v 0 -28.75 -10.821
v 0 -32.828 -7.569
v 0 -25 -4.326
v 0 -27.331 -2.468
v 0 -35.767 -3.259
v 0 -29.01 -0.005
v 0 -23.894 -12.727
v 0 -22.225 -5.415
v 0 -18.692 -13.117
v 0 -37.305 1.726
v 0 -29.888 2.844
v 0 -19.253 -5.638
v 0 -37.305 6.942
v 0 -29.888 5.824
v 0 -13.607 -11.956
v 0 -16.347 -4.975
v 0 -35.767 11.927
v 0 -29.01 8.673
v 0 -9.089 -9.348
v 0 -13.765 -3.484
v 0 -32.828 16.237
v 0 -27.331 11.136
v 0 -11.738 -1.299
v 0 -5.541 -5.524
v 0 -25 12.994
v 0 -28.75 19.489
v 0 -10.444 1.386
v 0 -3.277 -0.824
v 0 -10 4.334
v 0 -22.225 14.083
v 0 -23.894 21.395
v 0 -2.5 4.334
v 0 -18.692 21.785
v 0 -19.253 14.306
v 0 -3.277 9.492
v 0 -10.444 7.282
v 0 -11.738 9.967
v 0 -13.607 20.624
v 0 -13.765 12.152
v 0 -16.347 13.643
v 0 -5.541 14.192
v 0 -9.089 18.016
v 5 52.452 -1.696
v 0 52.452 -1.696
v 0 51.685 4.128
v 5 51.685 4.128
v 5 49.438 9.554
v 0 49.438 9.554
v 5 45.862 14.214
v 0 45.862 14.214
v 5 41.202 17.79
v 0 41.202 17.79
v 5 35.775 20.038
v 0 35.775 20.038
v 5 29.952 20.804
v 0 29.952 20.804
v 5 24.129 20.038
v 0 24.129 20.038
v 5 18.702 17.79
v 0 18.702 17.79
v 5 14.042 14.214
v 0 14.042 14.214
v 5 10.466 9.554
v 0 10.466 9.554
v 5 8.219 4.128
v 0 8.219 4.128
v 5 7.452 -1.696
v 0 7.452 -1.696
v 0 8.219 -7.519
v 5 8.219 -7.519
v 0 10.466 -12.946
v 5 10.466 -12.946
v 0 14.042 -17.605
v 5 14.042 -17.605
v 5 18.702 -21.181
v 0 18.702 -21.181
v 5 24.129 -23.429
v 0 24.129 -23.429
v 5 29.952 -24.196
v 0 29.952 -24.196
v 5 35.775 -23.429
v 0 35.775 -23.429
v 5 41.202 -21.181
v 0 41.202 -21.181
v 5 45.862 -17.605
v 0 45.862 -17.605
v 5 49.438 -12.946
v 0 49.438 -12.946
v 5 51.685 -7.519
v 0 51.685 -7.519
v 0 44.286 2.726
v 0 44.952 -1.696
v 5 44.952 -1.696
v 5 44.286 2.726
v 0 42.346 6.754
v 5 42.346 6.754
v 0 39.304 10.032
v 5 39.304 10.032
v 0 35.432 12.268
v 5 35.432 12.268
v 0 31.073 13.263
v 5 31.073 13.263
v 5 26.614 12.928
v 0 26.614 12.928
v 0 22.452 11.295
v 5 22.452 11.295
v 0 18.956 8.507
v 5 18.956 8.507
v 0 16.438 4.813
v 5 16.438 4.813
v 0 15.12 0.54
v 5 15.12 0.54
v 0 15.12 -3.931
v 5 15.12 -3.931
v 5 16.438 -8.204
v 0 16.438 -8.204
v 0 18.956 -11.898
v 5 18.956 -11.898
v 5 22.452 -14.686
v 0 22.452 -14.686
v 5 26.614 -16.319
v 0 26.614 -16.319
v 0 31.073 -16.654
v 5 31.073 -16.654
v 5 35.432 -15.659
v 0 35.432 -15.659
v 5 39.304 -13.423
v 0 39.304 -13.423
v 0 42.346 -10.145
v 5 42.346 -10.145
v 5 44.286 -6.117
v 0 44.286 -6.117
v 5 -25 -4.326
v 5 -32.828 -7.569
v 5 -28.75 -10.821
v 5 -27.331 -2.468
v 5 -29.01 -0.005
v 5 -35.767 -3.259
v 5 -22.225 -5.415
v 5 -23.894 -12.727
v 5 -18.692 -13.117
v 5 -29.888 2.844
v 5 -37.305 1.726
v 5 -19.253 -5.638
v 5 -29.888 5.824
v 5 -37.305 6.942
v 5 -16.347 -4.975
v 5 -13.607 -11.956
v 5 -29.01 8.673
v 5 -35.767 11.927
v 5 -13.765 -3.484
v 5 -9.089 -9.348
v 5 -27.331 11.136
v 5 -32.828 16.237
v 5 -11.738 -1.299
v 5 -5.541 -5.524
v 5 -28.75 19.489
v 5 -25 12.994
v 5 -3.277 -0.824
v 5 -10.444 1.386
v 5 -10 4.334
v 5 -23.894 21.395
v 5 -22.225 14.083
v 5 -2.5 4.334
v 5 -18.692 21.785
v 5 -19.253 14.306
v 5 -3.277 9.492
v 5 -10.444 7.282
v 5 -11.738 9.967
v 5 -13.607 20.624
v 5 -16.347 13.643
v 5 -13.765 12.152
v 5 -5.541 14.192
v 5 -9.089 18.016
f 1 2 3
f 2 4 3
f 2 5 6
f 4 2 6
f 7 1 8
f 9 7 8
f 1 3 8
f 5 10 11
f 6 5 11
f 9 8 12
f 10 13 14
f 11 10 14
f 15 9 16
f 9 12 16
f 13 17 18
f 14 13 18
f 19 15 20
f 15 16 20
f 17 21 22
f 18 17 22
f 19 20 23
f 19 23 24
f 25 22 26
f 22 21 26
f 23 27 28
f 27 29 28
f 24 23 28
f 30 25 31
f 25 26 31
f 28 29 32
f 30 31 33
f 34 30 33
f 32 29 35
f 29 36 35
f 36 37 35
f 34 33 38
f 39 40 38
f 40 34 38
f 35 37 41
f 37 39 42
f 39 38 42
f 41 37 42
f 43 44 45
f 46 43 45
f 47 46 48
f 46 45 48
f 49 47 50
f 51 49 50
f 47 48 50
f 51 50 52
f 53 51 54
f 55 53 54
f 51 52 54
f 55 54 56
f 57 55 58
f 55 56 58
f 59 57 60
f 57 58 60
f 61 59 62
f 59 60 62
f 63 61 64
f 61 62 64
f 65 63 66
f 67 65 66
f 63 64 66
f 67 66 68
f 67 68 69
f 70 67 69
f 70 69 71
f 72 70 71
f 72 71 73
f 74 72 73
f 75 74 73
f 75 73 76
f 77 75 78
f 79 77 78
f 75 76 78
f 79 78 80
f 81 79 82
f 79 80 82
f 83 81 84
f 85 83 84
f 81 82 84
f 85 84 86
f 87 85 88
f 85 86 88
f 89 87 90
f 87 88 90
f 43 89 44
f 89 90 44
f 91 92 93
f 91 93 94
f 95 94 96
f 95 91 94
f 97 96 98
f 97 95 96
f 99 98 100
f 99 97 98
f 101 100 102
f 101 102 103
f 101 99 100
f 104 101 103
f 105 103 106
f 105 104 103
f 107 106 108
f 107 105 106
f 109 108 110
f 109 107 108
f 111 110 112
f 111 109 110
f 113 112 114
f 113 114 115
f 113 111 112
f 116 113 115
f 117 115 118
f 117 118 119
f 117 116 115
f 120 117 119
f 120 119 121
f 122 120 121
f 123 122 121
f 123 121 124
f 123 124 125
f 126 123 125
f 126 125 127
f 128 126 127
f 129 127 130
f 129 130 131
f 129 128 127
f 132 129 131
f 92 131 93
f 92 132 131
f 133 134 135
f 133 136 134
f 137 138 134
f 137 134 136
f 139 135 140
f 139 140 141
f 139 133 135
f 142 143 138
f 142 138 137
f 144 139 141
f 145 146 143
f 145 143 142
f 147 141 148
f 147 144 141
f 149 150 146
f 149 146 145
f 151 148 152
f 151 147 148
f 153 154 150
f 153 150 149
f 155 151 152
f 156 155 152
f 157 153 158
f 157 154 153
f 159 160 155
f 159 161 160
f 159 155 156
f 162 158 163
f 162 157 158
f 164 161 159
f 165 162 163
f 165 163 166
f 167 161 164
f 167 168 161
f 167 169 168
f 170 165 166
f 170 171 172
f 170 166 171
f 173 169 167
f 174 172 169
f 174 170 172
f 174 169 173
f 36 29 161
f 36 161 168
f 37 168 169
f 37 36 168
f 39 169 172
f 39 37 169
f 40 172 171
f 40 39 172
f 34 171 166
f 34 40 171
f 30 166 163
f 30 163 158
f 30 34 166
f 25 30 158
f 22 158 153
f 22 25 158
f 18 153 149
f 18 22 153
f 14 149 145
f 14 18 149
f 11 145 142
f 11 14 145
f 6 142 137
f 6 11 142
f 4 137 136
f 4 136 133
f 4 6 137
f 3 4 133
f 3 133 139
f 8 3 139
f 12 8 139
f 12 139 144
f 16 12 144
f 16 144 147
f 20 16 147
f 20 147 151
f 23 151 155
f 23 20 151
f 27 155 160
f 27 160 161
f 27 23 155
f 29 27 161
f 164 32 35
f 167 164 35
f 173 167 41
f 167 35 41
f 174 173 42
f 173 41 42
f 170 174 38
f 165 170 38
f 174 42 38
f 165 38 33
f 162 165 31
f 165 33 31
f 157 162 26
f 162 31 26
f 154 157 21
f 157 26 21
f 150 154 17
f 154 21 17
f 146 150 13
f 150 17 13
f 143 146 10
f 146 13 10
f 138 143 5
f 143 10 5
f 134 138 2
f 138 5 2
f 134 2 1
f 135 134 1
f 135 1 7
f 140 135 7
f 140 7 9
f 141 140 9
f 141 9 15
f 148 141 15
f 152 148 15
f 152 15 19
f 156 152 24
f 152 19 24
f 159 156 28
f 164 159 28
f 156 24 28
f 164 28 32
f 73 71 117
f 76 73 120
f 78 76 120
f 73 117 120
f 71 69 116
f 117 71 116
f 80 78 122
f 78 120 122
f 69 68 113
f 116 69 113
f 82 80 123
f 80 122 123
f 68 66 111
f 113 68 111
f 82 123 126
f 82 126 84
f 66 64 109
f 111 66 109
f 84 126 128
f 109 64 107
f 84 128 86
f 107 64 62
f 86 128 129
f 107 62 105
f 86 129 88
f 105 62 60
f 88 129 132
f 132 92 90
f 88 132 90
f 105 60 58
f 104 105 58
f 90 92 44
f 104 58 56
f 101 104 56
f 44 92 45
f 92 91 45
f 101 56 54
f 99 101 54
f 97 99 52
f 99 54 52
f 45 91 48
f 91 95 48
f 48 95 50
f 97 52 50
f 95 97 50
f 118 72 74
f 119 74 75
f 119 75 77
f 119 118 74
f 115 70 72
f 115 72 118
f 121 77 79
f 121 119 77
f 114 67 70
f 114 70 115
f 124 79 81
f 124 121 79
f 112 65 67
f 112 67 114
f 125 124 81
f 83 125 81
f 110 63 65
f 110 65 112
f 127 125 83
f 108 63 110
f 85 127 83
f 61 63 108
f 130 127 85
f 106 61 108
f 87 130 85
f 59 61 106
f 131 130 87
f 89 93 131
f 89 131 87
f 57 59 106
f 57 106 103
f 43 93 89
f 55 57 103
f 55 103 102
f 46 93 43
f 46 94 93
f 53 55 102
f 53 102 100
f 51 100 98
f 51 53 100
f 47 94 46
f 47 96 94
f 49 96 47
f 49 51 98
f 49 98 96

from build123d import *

# Parameters (mm, degrees)
F0_R     = 17.5
F0_R_2   = 10
F0_R_3   = 22.5
F0_R_4   = 15
F1_DEPTH = 5


with BuildPart() as f1:
    # F0 (on Right) → F1 (new body)
    with BuildSketch(Plane.YZ):
        with Locations((-20, 4.334016)):
            Circle(F0_R)
        with Locations((-20, 4.334016)):
            Circle(F0_R_2, mode=Mode.SUBTRACT)
        with Locations((29.952047, -1.69555)):
            Circle(F0_R_3)
        with Locations((29.952047, -1.69555)):
            Circle(F0_R_4, mode=Mode.SUBTRACT)
    extrude(amount=F1_DEPTH)


solid = f1.part
